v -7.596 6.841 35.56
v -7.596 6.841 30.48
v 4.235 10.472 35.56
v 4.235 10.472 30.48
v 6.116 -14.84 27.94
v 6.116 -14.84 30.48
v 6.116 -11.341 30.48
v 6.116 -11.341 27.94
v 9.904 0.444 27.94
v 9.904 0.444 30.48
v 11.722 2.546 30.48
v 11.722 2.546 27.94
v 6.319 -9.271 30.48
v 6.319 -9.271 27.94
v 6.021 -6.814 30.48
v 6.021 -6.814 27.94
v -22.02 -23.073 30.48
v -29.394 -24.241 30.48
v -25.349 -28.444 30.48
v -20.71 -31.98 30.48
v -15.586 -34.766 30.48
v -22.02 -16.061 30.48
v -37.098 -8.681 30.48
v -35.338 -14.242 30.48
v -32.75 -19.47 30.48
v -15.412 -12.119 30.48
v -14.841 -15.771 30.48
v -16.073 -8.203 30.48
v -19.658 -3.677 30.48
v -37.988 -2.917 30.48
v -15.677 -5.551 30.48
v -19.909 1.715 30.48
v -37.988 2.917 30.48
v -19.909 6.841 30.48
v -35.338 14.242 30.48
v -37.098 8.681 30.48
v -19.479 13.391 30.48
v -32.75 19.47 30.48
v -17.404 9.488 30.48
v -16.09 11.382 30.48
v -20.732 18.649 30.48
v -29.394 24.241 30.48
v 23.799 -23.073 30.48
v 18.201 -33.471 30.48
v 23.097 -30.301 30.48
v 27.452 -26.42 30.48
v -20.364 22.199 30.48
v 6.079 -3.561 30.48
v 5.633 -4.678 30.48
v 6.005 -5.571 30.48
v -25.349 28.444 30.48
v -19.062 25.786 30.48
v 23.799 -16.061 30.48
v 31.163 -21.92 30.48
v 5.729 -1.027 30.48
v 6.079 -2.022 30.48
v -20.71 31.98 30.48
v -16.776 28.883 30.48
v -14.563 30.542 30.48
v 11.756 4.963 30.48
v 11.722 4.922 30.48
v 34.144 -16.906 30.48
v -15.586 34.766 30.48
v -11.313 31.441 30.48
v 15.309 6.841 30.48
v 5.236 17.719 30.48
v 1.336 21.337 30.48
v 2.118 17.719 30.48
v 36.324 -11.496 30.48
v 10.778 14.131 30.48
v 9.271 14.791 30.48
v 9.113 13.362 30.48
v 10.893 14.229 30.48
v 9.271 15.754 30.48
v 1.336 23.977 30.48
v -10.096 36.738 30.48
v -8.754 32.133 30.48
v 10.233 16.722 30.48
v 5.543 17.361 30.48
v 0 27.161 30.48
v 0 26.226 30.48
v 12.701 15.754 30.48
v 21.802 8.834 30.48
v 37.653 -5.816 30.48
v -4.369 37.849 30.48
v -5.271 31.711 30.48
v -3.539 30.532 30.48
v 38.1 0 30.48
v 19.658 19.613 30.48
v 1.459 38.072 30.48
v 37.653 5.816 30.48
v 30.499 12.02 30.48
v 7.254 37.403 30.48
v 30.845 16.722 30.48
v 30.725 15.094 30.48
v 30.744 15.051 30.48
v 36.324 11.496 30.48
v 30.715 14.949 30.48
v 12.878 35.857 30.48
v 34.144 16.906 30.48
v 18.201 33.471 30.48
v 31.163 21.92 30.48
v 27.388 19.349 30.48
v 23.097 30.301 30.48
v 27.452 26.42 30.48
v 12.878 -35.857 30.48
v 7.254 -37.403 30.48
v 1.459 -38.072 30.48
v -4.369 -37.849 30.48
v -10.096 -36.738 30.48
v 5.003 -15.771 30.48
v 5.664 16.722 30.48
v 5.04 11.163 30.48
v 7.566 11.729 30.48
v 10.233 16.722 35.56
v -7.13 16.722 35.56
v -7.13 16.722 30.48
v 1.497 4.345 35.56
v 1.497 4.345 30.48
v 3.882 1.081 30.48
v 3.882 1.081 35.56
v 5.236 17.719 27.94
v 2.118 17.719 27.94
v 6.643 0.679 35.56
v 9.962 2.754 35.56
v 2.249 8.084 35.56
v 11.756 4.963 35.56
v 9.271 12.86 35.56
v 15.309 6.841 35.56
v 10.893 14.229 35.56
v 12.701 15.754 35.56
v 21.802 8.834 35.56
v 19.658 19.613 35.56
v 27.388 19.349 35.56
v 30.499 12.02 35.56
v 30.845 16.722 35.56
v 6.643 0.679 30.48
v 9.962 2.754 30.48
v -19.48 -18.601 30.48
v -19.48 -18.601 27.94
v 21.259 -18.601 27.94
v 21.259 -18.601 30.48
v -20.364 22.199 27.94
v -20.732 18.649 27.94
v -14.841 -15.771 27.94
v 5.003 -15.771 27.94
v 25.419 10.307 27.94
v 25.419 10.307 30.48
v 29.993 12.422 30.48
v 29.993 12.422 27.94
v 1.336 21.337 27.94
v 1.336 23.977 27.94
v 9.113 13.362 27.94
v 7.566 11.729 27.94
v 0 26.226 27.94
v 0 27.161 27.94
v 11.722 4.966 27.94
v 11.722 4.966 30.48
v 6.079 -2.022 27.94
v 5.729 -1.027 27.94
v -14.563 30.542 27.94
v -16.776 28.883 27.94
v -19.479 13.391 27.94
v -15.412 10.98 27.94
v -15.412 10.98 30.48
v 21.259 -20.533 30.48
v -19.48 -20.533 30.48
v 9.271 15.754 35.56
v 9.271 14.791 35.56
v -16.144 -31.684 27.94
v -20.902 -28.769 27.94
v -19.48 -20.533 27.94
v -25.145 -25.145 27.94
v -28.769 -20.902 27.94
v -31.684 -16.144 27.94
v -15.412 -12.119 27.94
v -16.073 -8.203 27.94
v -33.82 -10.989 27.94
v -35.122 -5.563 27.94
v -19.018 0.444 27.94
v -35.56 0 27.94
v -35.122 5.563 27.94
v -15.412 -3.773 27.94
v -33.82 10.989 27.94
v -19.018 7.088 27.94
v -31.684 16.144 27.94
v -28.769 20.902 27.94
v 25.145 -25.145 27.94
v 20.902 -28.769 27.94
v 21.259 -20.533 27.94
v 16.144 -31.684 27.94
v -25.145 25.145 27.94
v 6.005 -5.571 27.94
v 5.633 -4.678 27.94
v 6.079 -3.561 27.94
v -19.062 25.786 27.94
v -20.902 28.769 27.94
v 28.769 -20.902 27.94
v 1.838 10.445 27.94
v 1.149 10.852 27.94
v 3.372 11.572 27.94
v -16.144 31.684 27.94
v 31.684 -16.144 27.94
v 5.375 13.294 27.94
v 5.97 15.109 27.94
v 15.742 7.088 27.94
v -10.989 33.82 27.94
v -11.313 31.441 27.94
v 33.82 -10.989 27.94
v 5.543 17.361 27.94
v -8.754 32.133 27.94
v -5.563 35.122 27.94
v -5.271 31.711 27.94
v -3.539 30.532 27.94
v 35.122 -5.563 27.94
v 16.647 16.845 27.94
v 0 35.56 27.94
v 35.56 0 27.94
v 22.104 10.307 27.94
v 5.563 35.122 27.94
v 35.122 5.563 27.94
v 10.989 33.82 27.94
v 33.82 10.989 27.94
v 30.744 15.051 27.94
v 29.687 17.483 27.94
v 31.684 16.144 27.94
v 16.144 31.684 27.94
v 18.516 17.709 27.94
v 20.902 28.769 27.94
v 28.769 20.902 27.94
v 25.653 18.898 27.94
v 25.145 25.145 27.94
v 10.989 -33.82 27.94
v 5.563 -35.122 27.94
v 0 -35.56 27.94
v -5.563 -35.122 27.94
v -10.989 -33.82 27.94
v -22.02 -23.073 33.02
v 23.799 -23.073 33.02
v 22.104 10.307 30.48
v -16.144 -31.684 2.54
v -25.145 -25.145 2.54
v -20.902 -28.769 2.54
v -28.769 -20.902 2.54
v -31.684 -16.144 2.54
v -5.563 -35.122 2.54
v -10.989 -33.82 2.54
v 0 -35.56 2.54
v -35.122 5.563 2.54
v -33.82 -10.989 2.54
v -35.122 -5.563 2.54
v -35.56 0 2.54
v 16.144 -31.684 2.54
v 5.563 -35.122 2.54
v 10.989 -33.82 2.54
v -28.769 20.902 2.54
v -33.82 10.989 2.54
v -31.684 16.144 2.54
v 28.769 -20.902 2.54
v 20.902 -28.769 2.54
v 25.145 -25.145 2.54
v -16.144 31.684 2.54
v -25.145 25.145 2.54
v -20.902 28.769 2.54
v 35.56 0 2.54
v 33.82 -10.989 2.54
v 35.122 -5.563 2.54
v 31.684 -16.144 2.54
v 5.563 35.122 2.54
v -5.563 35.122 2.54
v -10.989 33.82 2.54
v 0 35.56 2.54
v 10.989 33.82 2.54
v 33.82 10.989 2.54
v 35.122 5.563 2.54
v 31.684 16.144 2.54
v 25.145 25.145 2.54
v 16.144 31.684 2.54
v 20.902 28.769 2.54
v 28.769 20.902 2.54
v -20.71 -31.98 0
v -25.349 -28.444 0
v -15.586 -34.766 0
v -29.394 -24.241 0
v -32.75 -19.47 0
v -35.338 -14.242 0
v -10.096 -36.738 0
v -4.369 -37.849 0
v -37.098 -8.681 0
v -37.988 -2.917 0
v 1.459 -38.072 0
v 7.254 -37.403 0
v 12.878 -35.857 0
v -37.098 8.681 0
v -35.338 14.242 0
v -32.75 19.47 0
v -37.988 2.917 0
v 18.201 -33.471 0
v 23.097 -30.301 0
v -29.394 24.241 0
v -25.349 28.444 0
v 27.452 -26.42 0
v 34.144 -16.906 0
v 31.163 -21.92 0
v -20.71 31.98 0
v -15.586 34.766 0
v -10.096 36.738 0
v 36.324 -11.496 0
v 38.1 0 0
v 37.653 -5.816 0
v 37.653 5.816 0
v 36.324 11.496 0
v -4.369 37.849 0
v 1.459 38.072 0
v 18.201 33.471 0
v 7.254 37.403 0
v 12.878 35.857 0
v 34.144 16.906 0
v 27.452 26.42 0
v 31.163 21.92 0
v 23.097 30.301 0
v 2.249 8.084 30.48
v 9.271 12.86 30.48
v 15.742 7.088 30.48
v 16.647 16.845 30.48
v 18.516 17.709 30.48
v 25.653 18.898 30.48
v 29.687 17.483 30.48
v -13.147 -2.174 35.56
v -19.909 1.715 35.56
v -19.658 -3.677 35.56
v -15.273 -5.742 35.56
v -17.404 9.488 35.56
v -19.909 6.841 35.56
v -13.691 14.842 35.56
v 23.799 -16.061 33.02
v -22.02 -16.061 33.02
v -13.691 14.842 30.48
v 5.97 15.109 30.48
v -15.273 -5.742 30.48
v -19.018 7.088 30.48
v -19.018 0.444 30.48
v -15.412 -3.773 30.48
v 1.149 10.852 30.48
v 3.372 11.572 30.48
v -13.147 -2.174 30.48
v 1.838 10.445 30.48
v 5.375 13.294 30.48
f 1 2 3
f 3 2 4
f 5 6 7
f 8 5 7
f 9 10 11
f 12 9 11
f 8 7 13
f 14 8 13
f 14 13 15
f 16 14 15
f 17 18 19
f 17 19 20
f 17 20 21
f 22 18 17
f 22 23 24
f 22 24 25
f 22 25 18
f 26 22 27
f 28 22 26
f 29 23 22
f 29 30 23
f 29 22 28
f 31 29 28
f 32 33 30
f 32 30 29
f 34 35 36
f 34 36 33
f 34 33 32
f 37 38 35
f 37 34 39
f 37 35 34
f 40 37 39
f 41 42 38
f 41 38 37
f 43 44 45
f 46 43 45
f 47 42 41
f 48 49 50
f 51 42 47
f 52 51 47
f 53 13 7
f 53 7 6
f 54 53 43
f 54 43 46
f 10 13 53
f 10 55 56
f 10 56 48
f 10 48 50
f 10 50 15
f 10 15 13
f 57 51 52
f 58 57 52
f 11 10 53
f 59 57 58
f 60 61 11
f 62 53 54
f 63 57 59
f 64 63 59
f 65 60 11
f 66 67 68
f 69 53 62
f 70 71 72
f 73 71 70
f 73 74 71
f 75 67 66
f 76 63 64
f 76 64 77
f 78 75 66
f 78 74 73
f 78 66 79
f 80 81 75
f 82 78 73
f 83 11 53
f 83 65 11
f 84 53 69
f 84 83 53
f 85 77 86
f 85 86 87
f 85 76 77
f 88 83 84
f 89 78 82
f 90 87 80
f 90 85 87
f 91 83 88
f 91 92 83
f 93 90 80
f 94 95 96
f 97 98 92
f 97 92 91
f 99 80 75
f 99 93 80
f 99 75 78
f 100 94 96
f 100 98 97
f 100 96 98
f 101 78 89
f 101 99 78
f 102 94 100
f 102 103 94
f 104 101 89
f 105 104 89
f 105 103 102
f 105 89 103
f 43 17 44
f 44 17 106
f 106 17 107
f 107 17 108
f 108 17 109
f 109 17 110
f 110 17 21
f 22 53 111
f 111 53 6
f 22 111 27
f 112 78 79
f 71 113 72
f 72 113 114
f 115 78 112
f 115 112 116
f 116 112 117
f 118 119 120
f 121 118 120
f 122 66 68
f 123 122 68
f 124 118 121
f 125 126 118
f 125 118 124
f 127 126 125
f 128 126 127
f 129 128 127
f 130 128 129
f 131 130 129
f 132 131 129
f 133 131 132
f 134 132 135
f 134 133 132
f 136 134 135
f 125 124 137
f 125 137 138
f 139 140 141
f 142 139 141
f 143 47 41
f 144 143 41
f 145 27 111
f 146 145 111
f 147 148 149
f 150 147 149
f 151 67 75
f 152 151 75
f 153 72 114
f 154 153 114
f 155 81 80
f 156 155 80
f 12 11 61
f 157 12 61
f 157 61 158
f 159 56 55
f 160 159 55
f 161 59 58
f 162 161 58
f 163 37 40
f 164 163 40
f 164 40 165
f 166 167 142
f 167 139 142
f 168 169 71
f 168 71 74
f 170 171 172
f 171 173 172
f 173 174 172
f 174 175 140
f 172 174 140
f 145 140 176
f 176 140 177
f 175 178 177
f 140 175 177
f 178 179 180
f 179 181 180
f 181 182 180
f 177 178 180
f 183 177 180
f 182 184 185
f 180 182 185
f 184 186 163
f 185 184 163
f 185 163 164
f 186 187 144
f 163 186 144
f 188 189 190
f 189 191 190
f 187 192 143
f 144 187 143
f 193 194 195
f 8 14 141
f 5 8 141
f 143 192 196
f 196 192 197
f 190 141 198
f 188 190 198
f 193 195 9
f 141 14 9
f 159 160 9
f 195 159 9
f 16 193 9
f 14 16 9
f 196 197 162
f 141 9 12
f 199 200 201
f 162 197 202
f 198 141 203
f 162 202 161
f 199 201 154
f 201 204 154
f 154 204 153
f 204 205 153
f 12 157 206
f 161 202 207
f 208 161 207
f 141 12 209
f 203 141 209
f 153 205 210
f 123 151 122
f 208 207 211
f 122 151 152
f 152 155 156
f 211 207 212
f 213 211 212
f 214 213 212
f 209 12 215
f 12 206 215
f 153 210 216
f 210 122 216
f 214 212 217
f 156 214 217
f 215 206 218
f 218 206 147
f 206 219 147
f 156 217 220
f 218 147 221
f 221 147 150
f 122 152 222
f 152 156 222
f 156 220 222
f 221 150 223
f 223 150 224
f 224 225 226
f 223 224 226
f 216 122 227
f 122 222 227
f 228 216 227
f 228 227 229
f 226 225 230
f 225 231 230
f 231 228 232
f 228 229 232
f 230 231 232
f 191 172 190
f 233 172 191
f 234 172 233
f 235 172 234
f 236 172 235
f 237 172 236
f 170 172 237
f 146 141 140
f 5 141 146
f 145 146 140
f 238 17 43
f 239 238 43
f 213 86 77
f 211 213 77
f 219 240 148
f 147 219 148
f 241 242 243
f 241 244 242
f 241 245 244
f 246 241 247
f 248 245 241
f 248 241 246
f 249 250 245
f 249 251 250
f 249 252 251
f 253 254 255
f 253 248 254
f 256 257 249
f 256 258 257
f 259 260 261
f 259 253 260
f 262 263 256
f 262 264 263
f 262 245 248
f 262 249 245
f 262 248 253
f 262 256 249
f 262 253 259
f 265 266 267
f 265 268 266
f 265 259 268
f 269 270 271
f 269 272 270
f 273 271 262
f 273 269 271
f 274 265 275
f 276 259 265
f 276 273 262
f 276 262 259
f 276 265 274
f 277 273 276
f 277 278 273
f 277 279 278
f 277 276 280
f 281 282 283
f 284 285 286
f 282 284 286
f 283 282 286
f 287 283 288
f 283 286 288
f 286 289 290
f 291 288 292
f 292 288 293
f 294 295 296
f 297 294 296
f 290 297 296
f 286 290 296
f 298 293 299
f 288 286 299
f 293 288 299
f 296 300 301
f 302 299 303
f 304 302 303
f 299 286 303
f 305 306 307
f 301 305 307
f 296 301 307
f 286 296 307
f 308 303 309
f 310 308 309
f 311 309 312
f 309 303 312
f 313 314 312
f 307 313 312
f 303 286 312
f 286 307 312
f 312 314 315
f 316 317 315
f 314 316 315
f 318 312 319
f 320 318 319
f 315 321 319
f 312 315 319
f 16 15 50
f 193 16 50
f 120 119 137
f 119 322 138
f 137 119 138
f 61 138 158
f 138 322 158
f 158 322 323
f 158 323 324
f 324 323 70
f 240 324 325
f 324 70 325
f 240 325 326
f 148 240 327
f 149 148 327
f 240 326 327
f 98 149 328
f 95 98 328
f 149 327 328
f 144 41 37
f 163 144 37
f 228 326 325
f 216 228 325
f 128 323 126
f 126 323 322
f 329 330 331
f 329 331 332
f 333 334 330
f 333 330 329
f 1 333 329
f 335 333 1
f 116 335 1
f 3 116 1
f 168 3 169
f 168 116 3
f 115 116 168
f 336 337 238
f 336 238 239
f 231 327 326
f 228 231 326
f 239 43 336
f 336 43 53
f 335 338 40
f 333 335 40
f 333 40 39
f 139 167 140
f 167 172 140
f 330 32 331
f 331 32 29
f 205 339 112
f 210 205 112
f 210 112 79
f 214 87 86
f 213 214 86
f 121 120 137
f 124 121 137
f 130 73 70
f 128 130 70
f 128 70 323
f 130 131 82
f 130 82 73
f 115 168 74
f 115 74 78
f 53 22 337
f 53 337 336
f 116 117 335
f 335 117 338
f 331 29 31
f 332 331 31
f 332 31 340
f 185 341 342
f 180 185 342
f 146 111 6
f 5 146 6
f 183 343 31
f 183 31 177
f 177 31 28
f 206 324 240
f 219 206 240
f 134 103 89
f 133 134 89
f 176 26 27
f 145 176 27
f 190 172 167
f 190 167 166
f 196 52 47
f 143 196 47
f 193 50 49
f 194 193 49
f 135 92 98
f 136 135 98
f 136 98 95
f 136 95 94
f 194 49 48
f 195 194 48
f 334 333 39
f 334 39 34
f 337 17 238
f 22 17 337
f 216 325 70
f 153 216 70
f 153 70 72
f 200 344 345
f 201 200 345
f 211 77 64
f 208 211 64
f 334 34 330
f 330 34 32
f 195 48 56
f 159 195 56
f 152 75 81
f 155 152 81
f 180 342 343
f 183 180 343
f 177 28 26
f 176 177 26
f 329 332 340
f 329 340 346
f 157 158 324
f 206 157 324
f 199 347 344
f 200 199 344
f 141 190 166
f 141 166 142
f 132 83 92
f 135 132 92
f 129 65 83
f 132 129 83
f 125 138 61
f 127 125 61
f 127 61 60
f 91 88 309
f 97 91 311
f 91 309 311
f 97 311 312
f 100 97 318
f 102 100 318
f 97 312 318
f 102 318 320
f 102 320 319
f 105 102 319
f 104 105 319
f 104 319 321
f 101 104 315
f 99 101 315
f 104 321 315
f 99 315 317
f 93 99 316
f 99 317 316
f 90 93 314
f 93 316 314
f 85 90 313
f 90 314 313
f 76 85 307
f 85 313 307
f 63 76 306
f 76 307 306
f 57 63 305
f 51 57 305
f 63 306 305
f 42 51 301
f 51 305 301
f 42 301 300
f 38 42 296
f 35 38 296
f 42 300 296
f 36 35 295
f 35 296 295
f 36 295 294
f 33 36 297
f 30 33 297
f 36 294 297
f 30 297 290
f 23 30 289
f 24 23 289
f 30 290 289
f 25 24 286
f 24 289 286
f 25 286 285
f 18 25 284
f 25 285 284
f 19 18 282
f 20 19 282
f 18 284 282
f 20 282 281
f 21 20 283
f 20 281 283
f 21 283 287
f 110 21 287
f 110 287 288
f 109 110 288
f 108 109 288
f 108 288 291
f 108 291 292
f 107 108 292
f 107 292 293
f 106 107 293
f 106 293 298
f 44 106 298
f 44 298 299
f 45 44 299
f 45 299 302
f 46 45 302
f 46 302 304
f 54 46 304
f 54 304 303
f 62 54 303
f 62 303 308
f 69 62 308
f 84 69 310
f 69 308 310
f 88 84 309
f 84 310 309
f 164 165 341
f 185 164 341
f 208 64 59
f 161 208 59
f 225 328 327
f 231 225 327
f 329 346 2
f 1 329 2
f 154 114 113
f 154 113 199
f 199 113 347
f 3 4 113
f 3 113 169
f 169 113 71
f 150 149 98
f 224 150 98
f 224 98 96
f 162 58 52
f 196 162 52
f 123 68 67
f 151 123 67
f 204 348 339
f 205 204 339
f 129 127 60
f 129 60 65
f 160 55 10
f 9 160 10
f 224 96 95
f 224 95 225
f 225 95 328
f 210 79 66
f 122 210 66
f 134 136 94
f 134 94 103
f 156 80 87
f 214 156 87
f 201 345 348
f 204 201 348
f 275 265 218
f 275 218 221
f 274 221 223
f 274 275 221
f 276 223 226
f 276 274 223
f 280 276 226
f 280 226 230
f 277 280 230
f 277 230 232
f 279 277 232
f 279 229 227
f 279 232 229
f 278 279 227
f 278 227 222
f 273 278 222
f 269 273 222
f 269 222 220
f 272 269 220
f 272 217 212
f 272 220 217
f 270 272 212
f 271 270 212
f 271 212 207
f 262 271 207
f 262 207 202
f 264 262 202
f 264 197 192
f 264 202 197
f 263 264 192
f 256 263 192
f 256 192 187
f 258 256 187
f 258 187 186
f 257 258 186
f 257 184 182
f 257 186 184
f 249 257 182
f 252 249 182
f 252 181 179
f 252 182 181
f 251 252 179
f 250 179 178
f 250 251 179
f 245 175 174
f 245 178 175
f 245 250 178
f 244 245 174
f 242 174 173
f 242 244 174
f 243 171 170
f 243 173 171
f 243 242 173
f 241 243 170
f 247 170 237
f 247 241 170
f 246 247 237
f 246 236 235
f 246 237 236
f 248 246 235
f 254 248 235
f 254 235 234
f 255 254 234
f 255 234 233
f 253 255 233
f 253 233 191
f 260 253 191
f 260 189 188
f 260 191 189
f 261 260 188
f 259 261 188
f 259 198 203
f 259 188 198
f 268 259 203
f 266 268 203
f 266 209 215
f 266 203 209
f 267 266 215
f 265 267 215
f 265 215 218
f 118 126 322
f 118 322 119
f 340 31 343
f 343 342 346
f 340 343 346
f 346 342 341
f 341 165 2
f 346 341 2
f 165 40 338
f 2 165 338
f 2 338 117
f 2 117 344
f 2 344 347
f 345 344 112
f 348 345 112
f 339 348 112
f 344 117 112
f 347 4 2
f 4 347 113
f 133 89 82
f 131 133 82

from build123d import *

# Parameters (mm, degrees)
F0_R      = 38.1
F1_DEPTH  = 30.48
F2_W      = 45.819147911
F2_H      = 7.0118308067
F3_DEPTH  = 2.54
F4_T      = -2.54
F8_DEPTH  = 9.906
F10_DEPTH = 5.08


with BuildPart() as f1:
    # F0 (on Top) → F1 (new body)
    with BuildSketch(Plane.XY):
        Circle(F0_R)
    extrude(amount=F1_DEPTH)

    # F2 (on face) → F3 (join)
    with BuildSketch(Plane.XY.offset(30.48)):
        with Locations((0.8893240733, -19.5669056848)):
            Rectangle(F2_W, F2_H)
    extrude(amount=F3_DEPTH)

    # F4 (hollow: no face is removed)
    offset(amount=F4_T, kind=Kind.INTERSECTION, mode=Mode.SUBTRACT)

    # F7 (on face) → F8 (cut)
    with BuildSketch(Plane.XY.offset(30.48)):
        Polygon((-15.4119321378, -12.1194338849), (-14.841485885, -15.7707315361), (5.0025711535, -15.7707315361), (6.1164895305, -14.8400934836), (6.1164895305, -11.340892916), (6.3189007342, -9.2710563913), (6.0210963711, -6.8141715601), (6.0048130108, -5.5709355934), (5.6325580226, -4.6775222713), (6.0792639852, -3.5607567247), (6.0792639852, -2.0221695727), (5.7286338997, -1.0273779467), (9.9040070724, 0.4442985472), (11.7219447857, 2.5462731296), (11.7219447857, 4.9659329975), (15.7423027558, 7.0877885023), (22.1039241878, 10.3067904288), (25.4188793848, 10.3067904288), (29.9926726737, 12.4215105659), (30.7439389297, 15.0509480497), (29.6866364668, 17.4833167877), (25.6525882866, 18.8981650481), (18.5155458163, 17.708657504), (16.6474783241, 16.844945549), (9.1134678884, 13.3615516624), (7.5662216179, 11.7286253879), (1.8378060551, 10.445210726), (1.149144816, 10.8521465371), (3.3716449027, 11.5721119727), (5.3750247236, 13.2937669913), (5.9697784957, 15.1093309904), (5.5432569709, 17.361162805), (5.2361546324, 17.7185181528), (2.1184887737, 17.7185181528), (1.3361625606, 21.336780861), (1.3361625606, 23.9771343768), (0, 26.2263249606), (0, 27.1613527107), (-3.5394631901, 30.5318216514), (-5.2709043957, 31.7105762661), (-8.7543707341, 32.132551074), (-11.3128684461, 31.4410664141), (-14.5628526807, 30.542133376), (-16.7756080627, 28.8825668395), (-19.0620572539, 25.78573856), (-20.3636531951, 22.1986565316), (-20.7315385342, 18.6494737864), (-19.479425624, 13.39059975), (-15.4119321378, 10.9802337791), (-19.0177896293, 7.0877885023), (-19.0177896293, 0.4442985472), (-15.4119321378, -3.7730513141), (-16.0732436925, -8.2028741017), align=None)
    extrude(amount=-F8_DEPTH, mode=Mode.SUBTRACT)

    # F9 (on face) → F10 (join)
    with BuildSketch(Plane.XY.offset(30.48)):
        Polygon((9.2707704753, 15.7535430044), (10.2326864312, 16.7216230184), (-7.1297219356, 16.7216230184), (-13.6908106506, 14.8423165083), (-17.4043960869, 9.4877332449), (-19.9085921049, 6.8410946988), (-19.9085921049, 1.7150167664), (-19.6581706405, -3.6766524427), (-15.2726136148, -5.7415137999), (-13.1471836939, -2.1741164383), (-7.5955540778, 6.8410946988), (4.2351128765, 10.4722213), (9.2707704753, 14.7913218218), align=None)
        Polygon((3.8815487642, 1.0813763365), (6.6431248561, 0.6791502237), (9.9622569978, 2.7536081616), (11.7555428296, 4.9633402377), (15.3087614144, 6.8410946988), (21.8024684188, 8.8341752525), (30.4993893951, 12.0195187628), (30.8451298624, 16.7216230184), (27.3877009749, 19.3492695689), (19.6581706405, 19.6126438677), (12.7007676991, 15.7535430044), (10.8933802694, 14.2285590991), (9.2707704753, 12.8604179814), (2.2486662492, 8.0840246186), (1.4972069766, 4.3447160861), align=None)
    extrude(amount=F10_DEPTH)


solid = f1.part
